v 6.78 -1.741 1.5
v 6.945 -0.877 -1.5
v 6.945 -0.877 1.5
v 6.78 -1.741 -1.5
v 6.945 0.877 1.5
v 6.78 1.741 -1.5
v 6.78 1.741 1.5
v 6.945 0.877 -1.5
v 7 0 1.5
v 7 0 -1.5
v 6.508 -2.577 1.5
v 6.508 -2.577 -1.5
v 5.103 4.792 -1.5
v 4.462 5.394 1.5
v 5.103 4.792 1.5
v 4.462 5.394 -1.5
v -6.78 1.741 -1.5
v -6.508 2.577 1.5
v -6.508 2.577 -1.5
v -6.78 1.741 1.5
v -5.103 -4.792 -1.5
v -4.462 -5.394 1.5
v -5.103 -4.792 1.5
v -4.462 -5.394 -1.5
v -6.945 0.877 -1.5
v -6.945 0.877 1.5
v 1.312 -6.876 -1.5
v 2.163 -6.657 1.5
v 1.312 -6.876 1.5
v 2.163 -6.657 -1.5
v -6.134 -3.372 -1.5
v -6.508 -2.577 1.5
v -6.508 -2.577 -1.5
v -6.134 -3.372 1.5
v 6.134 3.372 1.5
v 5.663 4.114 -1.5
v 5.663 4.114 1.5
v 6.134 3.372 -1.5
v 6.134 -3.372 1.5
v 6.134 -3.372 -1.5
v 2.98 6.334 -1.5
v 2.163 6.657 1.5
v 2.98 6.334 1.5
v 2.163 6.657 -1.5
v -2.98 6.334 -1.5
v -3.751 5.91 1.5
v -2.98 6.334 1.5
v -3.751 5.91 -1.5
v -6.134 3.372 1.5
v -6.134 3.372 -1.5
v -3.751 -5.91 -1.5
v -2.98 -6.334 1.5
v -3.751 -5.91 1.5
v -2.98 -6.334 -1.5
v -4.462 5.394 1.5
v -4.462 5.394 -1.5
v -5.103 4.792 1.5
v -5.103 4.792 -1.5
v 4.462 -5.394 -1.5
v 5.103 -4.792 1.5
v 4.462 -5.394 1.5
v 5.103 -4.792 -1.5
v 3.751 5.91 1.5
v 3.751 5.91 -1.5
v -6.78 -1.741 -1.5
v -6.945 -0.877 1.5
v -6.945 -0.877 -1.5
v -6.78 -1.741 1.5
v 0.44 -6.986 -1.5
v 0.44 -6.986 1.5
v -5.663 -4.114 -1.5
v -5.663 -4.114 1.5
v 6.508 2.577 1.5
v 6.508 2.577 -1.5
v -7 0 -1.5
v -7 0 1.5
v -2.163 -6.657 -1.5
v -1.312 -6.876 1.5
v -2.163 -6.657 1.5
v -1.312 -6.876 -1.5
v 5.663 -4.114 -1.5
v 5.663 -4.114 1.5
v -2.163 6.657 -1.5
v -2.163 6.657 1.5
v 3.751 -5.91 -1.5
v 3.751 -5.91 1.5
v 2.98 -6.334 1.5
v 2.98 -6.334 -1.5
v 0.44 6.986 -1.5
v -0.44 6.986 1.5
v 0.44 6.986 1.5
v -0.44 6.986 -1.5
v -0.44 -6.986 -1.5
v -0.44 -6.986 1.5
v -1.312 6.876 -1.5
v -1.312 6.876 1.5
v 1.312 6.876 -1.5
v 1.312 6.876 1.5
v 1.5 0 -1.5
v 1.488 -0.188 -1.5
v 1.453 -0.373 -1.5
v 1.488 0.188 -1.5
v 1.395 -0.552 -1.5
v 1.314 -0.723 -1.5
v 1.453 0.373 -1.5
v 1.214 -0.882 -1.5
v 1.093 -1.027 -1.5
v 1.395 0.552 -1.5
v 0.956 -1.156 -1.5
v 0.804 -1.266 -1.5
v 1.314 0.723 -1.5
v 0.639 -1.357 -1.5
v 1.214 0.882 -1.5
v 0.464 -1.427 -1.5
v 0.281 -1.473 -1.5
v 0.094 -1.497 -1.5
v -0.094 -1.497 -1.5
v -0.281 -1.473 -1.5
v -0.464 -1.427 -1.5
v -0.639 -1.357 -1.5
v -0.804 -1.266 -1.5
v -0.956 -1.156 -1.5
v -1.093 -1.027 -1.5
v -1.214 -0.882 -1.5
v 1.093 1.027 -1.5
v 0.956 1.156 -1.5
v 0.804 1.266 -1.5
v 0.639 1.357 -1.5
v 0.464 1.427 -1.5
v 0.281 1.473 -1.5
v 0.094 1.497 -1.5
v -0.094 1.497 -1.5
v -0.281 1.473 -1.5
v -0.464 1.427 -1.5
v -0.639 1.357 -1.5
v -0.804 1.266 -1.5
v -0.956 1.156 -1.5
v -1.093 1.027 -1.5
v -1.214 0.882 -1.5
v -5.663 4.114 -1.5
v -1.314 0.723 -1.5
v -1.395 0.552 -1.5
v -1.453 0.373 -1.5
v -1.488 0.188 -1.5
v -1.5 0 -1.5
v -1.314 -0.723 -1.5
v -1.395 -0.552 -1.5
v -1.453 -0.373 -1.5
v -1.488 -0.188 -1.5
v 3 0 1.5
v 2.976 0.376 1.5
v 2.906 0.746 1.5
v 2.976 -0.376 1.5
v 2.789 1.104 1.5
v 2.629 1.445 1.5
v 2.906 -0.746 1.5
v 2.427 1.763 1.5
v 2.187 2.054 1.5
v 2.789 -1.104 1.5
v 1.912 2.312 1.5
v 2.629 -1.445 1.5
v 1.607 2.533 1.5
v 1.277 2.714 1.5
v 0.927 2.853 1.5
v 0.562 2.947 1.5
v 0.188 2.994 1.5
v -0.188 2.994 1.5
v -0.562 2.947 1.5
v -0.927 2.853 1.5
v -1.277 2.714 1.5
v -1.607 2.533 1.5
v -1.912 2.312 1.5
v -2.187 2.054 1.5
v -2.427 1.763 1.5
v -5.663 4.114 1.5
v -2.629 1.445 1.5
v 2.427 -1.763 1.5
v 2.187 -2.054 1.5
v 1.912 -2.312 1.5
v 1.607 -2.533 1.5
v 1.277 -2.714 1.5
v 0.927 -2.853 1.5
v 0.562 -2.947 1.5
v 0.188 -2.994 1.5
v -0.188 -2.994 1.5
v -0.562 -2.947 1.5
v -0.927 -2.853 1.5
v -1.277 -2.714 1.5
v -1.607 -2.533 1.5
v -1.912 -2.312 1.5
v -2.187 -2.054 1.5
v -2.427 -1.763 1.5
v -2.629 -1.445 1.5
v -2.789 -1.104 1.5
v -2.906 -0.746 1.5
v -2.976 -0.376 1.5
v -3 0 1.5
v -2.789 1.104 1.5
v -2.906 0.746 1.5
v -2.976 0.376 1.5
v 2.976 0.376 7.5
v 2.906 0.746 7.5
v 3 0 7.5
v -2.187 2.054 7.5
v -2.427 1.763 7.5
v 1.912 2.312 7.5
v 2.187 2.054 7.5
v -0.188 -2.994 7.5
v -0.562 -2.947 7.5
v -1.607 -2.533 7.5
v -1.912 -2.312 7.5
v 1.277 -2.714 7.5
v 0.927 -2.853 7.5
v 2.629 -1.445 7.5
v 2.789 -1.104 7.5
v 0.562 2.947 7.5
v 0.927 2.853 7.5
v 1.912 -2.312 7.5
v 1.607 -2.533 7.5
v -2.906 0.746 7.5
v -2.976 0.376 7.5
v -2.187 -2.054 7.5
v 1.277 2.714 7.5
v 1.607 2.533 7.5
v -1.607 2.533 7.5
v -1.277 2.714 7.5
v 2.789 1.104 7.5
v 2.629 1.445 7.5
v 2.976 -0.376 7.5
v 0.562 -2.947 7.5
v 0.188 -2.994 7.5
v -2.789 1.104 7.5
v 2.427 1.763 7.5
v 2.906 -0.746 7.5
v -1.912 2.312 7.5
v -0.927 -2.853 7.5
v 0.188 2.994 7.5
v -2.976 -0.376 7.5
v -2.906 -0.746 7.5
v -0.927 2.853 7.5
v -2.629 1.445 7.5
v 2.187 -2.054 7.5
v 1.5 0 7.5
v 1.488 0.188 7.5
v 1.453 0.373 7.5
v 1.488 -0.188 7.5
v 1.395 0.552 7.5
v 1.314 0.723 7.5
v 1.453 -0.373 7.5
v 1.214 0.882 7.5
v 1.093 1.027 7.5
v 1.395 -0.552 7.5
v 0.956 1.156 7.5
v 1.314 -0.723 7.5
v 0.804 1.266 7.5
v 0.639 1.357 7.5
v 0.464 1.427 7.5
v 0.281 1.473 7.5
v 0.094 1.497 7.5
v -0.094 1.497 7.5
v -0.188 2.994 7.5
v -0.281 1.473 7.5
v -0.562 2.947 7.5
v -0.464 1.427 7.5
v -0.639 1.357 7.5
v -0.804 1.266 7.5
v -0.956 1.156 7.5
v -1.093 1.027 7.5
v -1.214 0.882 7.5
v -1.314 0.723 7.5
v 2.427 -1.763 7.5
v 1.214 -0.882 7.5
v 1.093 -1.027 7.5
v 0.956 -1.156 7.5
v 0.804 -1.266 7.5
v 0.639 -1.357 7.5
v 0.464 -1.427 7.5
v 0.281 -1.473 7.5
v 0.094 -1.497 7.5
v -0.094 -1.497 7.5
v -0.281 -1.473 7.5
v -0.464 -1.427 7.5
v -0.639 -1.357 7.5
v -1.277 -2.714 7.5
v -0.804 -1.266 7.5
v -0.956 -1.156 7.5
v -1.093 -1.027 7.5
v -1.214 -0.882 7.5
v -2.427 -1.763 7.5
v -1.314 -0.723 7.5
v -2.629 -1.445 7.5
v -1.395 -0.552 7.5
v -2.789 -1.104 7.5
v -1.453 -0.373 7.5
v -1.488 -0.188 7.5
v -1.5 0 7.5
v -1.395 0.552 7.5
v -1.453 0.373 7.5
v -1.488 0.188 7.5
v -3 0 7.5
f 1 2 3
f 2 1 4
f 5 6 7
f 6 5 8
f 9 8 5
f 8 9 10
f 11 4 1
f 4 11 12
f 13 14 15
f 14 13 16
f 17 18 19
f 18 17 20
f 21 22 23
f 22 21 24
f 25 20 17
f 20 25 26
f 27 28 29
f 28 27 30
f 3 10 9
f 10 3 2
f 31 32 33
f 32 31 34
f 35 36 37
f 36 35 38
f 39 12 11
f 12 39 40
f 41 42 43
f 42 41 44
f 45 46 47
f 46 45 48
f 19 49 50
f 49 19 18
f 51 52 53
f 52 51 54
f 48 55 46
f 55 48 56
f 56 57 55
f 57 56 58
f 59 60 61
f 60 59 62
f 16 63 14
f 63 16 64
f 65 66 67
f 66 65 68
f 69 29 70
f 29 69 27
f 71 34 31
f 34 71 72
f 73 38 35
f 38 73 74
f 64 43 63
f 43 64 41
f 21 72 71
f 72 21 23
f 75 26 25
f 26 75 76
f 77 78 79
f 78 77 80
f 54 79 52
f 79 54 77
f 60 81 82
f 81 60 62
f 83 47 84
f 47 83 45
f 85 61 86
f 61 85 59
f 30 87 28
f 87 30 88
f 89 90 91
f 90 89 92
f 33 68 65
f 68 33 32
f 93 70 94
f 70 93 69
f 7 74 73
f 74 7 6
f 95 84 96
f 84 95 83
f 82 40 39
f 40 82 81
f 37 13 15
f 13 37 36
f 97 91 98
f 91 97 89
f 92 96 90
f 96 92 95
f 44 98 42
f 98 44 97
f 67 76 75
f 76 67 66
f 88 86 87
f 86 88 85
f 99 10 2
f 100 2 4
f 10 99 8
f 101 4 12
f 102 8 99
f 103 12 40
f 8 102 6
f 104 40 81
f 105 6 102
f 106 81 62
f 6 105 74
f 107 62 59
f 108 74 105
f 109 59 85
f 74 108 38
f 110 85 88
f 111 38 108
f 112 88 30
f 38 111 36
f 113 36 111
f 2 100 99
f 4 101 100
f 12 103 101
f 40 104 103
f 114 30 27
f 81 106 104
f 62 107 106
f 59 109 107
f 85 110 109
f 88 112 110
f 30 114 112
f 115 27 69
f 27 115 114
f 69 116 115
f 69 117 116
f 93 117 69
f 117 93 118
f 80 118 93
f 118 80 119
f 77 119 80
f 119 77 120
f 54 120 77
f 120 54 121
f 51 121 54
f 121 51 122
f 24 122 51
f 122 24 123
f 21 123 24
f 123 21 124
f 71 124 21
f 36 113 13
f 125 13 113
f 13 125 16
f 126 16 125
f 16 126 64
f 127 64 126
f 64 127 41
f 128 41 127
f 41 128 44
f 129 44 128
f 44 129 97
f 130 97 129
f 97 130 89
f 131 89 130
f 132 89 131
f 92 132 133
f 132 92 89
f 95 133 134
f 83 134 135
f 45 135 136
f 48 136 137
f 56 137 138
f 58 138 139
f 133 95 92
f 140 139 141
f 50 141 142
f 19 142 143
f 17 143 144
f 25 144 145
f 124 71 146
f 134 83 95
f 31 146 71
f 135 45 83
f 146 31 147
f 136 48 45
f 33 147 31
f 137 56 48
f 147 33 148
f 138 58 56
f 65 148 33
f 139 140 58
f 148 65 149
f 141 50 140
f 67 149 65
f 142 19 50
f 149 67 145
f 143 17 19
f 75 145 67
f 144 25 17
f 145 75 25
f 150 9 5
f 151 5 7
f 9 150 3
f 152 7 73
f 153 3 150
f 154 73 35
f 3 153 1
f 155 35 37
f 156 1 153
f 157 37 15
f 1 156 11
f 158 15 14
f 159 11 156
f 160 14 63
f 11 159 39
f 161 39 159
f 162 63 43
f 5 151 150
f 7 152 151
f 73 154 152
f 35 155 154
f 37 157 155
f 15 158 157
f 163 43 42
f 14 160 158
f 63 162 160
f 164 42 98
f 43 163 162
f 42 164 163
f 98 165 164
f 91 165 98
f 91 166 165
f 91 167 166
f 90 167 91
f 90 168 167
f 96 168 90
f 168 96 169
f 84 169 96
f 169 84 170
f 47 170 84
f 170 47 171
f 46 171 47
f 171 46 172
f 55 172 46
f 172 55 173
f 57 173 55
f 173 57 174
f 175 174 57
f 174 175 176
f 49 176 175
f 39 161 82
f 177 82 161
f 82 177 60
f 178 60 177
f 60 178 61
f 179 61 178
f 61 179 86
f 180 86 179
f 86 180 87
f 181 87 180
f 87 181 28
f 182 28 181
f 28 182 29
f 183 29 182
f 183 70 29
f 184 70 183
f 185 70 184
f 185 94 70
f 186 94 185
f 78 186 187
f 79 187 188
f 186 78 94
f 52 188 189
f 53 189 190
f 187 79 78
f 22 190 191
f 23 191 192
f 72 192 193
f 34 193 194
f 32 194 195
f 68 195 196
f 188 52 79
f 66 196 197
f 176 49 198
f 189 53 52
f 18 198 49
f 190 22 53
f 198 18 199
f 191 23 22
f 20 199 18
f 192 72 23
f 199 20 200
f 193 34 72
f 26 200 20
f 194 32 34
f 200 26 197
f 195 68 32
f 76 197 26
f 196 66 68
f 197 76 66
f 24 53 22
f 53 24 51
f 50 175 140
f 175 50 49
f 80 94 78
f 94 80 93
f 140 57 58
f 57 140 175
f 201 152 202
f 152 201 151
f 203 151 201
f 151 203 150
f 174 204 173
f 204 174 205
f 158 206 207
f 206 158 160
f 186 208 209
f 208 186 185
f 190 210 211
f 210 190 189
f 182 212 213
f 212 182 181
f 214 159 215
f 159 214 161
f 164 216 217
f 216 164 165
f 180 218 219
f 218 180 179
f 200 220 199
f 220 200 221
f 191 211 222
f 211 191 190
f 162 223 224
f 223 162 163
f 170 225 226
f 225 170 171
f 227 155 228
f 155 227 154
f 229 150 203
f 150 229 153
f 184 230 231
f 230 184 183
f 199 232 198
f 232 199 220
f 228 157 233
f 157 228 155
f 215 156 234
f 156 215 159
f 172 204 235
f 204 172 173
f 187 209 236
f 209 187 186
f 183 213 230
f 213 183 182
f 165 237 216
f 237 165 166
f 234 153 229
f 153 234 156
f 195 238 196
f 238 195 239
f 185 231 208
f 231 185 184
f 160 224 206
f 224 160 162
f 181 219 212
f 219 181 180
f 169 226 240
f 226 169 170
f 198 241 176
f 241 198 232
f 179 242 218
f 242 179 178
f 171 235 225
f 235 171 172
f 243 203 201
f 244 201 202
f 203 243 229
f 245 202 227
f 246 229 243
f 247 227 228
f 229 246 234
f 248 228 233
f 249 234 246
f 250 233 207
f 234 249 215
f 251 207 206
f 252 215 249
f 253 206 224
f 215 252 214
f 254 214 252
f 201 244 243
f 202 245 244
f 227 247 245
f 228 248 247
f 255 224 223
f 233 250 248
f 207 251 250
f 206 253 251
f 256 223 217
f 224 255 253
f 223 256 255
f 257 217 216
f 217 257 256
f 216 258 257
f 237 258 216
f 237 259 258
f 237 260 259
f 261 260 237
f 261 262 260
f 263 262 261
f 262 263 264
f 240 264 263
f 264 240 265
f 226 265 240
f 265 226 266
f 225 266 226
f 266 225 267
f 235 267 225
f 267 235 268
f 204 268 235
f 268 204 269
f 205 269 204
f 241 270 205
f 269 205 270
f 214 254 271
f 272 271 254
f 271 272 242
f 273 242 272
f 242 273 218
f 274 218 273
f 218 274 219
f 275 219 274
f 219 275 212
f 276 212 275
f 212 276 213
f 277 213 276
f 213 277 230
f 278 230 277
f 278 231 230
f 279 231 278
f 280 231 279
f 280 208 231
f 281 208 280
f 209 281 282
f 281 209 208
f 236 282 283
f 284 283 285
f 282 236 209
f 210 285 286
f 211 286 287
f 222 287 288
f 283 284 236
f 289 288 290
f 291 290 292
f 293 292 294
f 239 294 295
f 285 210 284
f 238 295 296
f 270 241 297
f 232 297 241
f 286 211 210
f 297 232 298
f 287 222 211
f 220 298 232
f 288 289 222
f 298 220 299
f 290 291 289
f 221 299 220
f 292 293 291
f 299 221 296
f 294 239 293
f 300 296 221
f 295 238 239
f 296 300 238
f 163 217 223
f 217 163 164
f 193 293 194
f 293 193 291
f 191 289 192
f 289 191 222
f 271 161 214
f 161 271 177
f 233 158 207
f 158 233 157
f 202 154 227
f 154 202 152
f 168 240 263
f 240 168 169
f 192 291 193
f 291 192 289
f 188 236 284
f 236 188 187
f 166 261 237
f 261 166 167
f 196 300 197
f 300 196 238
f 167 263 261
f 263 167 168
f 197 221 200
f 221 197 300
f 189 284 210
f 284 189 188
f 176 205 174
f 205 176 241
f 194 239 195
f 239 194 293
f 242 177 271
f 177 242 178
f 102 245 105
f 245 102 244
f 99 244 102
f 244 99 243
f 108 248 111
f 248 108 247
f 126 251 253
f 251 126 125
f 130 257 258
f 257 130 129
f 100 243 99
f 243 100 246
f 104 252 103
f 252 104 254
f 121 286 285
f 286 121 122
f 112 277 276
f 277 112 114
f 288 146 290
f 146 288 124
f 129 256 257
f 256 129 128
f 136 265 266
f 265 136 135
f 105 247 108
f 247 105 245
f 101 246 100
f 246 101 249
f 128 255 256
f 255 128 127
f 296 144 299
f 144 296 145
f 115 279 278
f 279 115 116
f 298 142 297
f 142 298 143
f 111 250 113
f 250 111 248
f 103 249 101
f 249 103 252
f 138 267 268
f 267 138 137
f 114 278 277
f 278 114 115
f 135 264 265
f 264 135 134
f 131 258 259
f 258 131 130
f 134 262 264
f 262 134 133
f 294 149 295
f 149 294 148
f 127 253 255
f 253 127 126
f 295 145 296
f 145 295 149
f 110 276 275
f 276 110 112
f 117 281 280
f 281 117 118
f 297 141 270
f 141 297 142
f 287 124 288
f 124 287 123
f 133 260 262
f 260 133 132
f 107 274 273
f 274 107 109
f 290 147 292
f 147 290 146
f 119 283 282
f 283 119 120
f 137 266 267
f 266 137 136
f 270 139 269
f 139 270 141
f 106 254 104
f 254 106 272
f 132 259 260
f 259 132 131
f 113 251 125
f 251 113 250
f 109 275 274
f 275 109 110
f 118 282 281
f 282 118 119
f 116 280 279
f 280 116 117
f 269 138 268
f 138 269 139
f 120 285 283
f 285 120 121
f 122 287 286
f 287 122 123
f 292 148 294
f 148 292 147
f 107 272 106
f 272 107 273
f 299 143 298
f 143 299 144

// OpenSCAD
$fn = 50;


difference() {
	union() {
		translate(v = [0, 0, -1.5000000000]) {
			cylinder(h = 3, r = 7.0000000000);
		}
		translate(v = [0, 0, -1.5000000000]) {
			cylinder(h = 9, r = 3.0000000000);
		}
	}
	union() {
		translate(v = [0, 0, -50.0000000000]) {
			cylinder(h = 100, r = 1.5000000000);
		}
	}
}
